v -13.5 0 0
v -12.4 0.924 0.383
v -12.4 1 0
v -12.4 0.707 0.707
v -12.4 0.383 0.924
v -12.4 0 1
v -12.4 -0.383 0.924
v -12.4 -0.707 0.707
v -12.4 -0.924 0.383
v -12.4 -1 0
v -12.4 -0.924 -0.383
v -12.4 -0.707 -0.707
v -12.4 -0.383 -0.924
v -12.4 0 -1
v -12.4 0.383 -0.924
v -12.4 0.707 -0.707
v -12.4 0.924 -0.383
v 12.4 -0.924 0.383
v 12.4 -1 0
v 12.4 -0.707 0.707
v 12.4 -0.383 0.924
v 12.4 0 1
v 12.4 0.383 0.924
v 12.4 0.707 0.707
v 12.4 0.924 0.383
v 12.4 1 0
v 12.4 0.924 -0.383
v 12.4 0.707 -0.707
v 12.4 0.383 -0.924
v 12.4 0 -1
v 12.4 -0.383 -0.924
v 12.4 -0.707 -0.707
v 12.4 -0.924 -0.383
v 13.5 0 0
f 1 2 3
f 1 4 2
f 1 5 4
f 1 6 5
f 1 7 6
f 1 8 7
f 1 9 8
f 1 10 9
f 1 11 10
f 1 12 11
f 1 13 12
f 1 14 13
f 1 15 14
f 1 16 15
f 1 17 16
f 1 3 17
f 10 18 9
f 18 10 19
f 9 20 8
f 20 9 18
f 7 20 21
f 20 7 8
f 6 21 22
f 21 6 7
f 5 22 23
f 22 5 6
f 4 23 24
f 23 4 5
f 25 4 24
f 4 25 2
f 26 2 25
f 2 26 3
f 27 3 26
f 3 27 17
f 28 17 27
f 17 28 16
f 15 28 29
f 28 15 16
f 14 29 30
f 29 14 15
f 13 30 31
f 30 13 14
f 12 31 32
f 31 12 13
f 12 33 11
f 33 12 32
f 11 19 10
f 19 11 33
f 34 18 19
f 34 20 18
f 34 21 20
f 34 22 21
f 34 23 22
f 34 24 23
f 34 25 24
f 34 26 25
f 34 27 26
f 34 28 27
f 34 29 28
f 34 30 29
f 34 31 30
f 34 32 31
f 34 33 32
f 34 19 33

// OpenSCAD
// file: ../p/4-4edge.scad
use <../lib.scad>
function ldraw_lib__4_4edge() = [
// 0 Circle 1.0
// 0 Name: 4-4edge.dat
// 0 Author: James Jessiman
// 0 !LDRAW_ORG Primitive UPDATE 2017-01
// 0 !LICENSE Licensed under CC BY 2.0 and CC BY 4.0 : see CAreadme.txt
// 
// 0 BFC CERTIFY CCW
  [0,"BFC","CERTIFY"],
  [0,"BFC","CCW"],
// 
// 0 !HISTORY 1998-12-15 [PTadmin] Official Update 1998-10
// 0 !HISTORY 2005-12-28 [PTadmin] Official Update 2005-01
// 0 !HISTORY 2007-06-24 [PTadmin] Header formatted for Contributor Agreement
// 0 !HISTORY 2008-07-01 [PTadmin] Official Update 2008-01
// 0 !HISTORY 2017-01-15 [Steffen] BFCed
// 0 !HISTORY 2017-12-30 [PTadmin] Official Update 2017-01
// 
// 
// 2 24 1 0 0 0.9239 0 0.3827
  [2,24,1,0,0,0.9239,0,0.3827],
// 2 24 0.9239 0 0.3827 0.7071 0 0.7071
  [2,24,0.9239,0,0.3827,0.7071,0,0.7071],
// 2 24 0.7071 0 0.7071 0.3827 0 0.9239
  [2,24,0.7071,0,0.7071,0.3827,0,0.9239],
// 2 24 0.3827 0 0.9239 0 0 1
  [2,24,0.3827,0,0.9239,0,0,1],
// 2 24 0 0 1 -0.3827 0 0.9239
  [2,24,0,0,1,-0.3827,0,0.9239],
// 2 24 -0.3827 0 0.9239 -0.7071 0 0.7071
  [2,24,-0.3827,0,0.9239,-0.7071,0,0.7071],
// 2 24 -0.7071 0 0.7071 -0.9239 0 0.3827
  [2,24,-0.7071,0,0.7071,-0.9239,0,0.3827],
// 2 24 -0.9239 0 0.3827 -1 0 -0
  [2,24,-0.9239,0,0.3827,-1,0,-0],
// 2 24 -1 0 -0 -0.9239 0 -0.3827
  [2,24,-1,0,-0,-0.9239,0,-0.3827],
// 2 24 -0.9239 0 -0.3827 -0.7071 0 -0.7071
  [2,24,-0.9239,0,-0.3827,-0.7071,0,-0.7071],
// 2 24 -0.7071 0 -0.7071 -0.3827 0 -0.9239
  [2,24,-0.7071,0,-0.7071,-0.3827,0,-0.9239],
// 2 24 -0.3827 0 -0.9239 0 0 -1
  [2,24,-0.3827,0,-0.9239,0,0,-1],
// 2 24 0 0 -1 0.3827 0 -0.9239
  [2,24,0,0,-1,0.3827,0,-0.9239],
// 2 24 0.3827 0 -0.9239 0.7071 0 -0.7071
  [2,24,0.3827,0,-0.9239,0.7071,0,-0.7071],
// 2 24 0.7071 0 -0.7071 0.9239 0 -0.3827
  [2,24,0.7071,0,-0.7071,0.9239,0,-0.3827],
// 2 24 0.9239 0 -0.3827 1 0 0
  [2,24,0.9239,0,-0.3827,1,0,0],
];
makepoly(ldraw_lib__4_4edge(), line=0.2);
// file: ../p/4-4cyli.scad
use <../lib.scad>
function ldraw_lib__4_4cyli() = [
// 0 Cylinder 1.0
// 0 Name: 4-4cyli.dat
// 0 Author: James Jessiman
// 0 !LDRAW_ORG Primitive UPDATE 2005-01
// 0 !LICENSE Licensed under CC BY 2.0 and CC BY 4.0 : see CAreadme.txt
// 
// 0 BFC CERTIFY CCW
  [0,"BFC","CERTIFY"],
  [0,"BFC","CCW"],
// 
// 0 !HISTORY 1998-12-15 [PTadmin] Official Update 1998-10
// 0 !HISTORY 2002-03-23 [sbliss] Added BFC statement; merged headers from files in distributions LDraw 0.27 and Complete.
// 0 !HISTORY 2002-04-25 [PTadmin] Official Update 2002-02
// 0 !HISTORY 2004-12-14 [guyvivan] BFC CCW
// 0 !HISTORY 2005-12-28 [PTadmin] Official Update 2005-01
// 0 !HISTORY 2007-06-24 [PTadmin] Header formatted for Contributor Agreement
// 0 !HISTORY 2008-07-01 [PTadmin] Official Update 2008-01
// 
// 
// 4 16 1 1 0 0.9239 1 0.3827 0.9239 0 0.3827 1 0 0
  [4,16,1,1,0,0.9239,1,0.3827,0.9239,0,0.3827,1,0,0],
// 5 24 1 0 0 1 1 0 0.9239 0 0.3827 0.9239 0 -0.3827
  [5,24,1,0,0,1,1,0,0.9239,0,0.3827,0.9239,0,-0.3827],
// 4 16 0.9239 1 0.3827 0.7071 1 0.7071 0.7071 0 0.7071 0.9239 0 0.3827
  [4,16,0.9239,1,0.3827,0.7071,1,0.7071,0.7071,0,0.7071,0.9239,0,0.3827],
// 5 24 0.9239 0 0.3827 0.9239 1 0.3827 0.7071 0 0.7071 1 0 0
  [5,24,0.9239,0,0.3827,0.9239,1,0.3827,0.7071,0,0.7071,1,0,0],
// 4 16 0.7071 1 0.7071 0.3827 1 0.9239 0.3827 0 0.9239 0.7071 0 0.7071
  [4,16,0.7071,1,0.7071,0.3827,1,0.9239,0.3827,0,0.9239,0.7071,0,0.7071],
// 5 24 0.7071 0 0.7071 0.7071 1 0.7071 0.3827 0 0.9239 0.9239 0 0.3827
  [5,24,0.7071,0,0.7071,0.7071,1,0.7071,0.3827,0,0.9239,0.9239,0,0.3827],
// 4 16 0.3827 1 0.9239 0 1 1 0 0 1 0.3827 0 0.9239
  [4,16,0.3827,1,0.9239,0,1,1,0,0,1,0.3827,0,0.9239],
// 5 24 0.3827 0 0.9239 0.3827 1 0.9239 0 0 1 0.7071 0 0.7071
  [5,24,0.3827,0,0.9239,0.3827,1,0.9239,0,0,1,0.7071,0,0.7071],
// 4 16 0 1 1 -0.3827 1 0.9239 -0.3827 0 0.9239 0 0 1
  [4,16,0,1,1,-0.3827,1,0.9239,-0.3827,0,0.9239,0,0,1],
// 5 24 0 0 1 0 1 1 -0.3827 0 0.9239 0.3827 0 0.9239
  [5,24,0,0,1,0,1,1,-0.3827,0,0.9239,0.3827,0,0.9239],
// 4 16 -0.3827 1 0.9239 -0.7071 1 0.7071 -0.7071 0 0.7071 -0.3827 0 0.9239
  [4,16,-0.3827,1,0.9239,-0.7071,1,0.7071,-0.7071,0,0.7071,-0.3827,0,0.9239],
// 5 24 -0.3827 0 0.9239 -0.3827 1 0.9239 -0.7071 0 0.7071 0 0 1
  [5,24,-0.3827,0,0.9239,-0.3827,1,0.9239,-0.7071,0,0.7071,0,0,1],
// 4 16 -0.7071 1 0.7071 -0.9239 1 0.3827 -0.9239 0 0.3827 -0.7071 0 0.7071
  [4,16,-0.7071,1,0.7071,-0.9239,1,0.3827,-0.9239,0,0.3827,-0.7071,0,0.7071],
// 5 24 -0.7071 0 0.7071 -0.7071 1 0.7071 -0.9239 0 0.3827 -0.3827 0 0.9239
  [5,24,-0.7071,0,0.7071,-0.7071,1,0.7071,-0.9239,0,0.3827,-0.3827,0,0.9239],
// 4 16 -0.9239 1 0.3827 -1 1 0 -1 0 0 -0.9239 0 0.3827
  [4,16,-0.9239,1,0.3827,-1,1,0,-1,0,0,-0.9239,0,0.3827],
// 5 24 -0.9239 0 0.3827 -0.9239 1 0.3827 -1 0 0 -0.7071 0 0.7071
  [5,24,-0.9239,0,0.3827,-0.9239,1,0.3827,-1,0,0,-0.7071,0,0.7071],
// 4 16 -1 1 0 -0.9239 1 -0.3827 -0.9239 0 -0.3827 -1 0 0
  [4,16,-1,1,0,-0.9239,1,-0.3827,-0.9239,0,-0.3827,-1,0,0],
// 5 24 -1 0 0 -1 1 0 -0.9239 0 -0.3827 -0.9239 0 0.3827
  [5,24,-1,0,0,-1,1,0,-0.9239,0,-0.3827,-0.9239,0,0.3827],
// 4 16 -0.9239 1 -0.3827 -0.7071 1 -0.7071 -0.7071 0 -0.7071 -0.9239 0 -0.3827
  [4,16,-0.9239,1,-0.3827,-0.7071,1,-0.7071,-0.7071,0,-0.7071,-0.9239,0,-0.3827],
// 5 24 -0.9239 0 -0.3827 -0.9239 1 -0.3827 -0.7071 0 -0.7071 -1 0 0
  [5,24,-0.9239,0,-0.3827,-0.9239,1,-0.3827,-0.7071,0,-0.7071,-1,0,0],
// 4 16 -0.7071 1 -0.7071 -0.3827 1 -0.9239 -0.3827 0 -0.9239 -0.7071 0 -0.7071
  [4,16,-0.7071,1,-0.7071,-0.3827,1,-0.9239,-0.3827,0,-0.9239,-0.7071,0,-0.7071],
// 5 24 -0.7071 0 -0.7071 -0.7071 1 -0.7071 -0.3827 0 -0.9239 -0.9239 0 -0.3827
  [5,24,-0.7071,0,-0.7071,-0.7071,1,-0.7071,-0.3827,0,-0.9239,-0.9239,0,-0.3827],
// 4 16 -0.3827 1 -0.9239 0 1 -1 0 0 -1 -0.3827 0 -0.9239
  [4,16,-0.3827,1,-0.9239,0,1,-1,0,0,-1,-0.3827,0,-0.9239],
// 5 24 -0.3827 0 -0.9239 -0.3827 1 -0.9239 0 0 -1 -0.7071 0 -0.7071
  [5,24,-0.3827,0,-0.9239,-0.3827,1,-0.9239,0,0,-1,-0.7071,0,-0.7071],
// 4 16 0 1 -1 0.3827 1 -0.9239 0.3827 0 -0.9239 0 0 -1
  [4,16,0,1,-1,0.3827,1,-0.9239,0.3827,0,-0.9239,0,0,-1],
// 5 24 0 0 -1 0 1 -1 0.3827 0 -0.9239 -0.3827 0 -0.9239
  [5,24,0,0,-1,0,1,-1,0.3827,0,-0.9239,-0.3827,0,-0.9239],
// 4 16 0.3827 1 -0.9239 0.7071 1 -0.7071 0.7071 0 -0.7071 0.3827 0 -0.9239
  [4,16,0.3827,1,-0.9239,0.7071,1,-0.7071,0.7071,0,-0.7071,0.3827,0,-0.9239],
// 5 24 0.3827 0 -0.9239 0.3827 1 -0.9239 0.7071 0 -0.7071 0 0 -1
  [5,24,0.3827,0,-0.9239,0.3827,1,-0.9239,0.7071,0,-0.7071,0,0,-1],
// 4 16 0.7071 1 -0.7071 0.9239 1 -0.3827 0.9239 0 -0.3827 0.7071 0 -0.7071
  [4,16,0.7071,1,-0.7071,0.9239,1,-0.3827,0.9239,0,-0.3827,0.7071,0,-0.7071],
// 5 24 0.7071 0 -0.7071 0.7071 1 -0.7071 0.9239 0 -0.3827 0.3827 0 -0.9239
  [5,24,0.7071,0,-0.7071,0.7071,1,-0.7071,0.9239,0,-0.3827,0.3827,0,-0.9239],
// 4 16 0.9239 1 -0.3827 1 1 0 1 0 0 0.9239 0 -0.3827
  [4,16,0.9239,1,-0.3827,1,1,0,1,0,0,0.9239,0,-0.3827],
// 5 24 0.9239 0 -0.3827 0.9239 1 -0.3827 1 0 0 0.7071 0 -0.7071
  [5,24,0.9239,0,-0.3827,0.9239,1,-0.3827,1,0,0,0.7071,0,-0.7071],
// 0
];
makepoly(ldraw_lib__4_4cyli(), line=0.2);
// file: ../p/4-4cylo.scad
use <../lib.scad>
use <4-4cyli.scad>
use <4-4edge.scad>
function ldraw_lib__4_4cylo() = [
// 0 Cylinder Open 1.0
// 0 Name: 4-4cylo.dat
// 0 Author: Mark Kennedy [mkennedy]
// 0 !LDRAW_ORG Primitive UPDATE 2010-01
// 0 !LICENSE Licensed under CC BY 2.0 and CC BY 4.0 : see CAreadme.txt
// 
// 0 BFC CERTIFY CCW
  [0,"BFC","CERTIFY"],
  [0,"BFC","CCW"],
// 
// 0 !HISTORY 2010-04-05 [PTadmin] Official Update 2010-01
// 
// 
// 1 16 0 0 0 1 0 0 0 1 0 0 0 1 4-4edge.dat
  [1,16,0,0,0,1,0,0,0,1,0,0,0,1, ldraw_lib__4_4edge()],
// 1 16 0 1 0 1 0 0 0 1 0 0 0 1 4-4edge.dat
  [1,16,0,1,0,1,0,0,0,1,0,0,0,1, ldraw_lib__4_4edge()],
// 1 16 0 0 0 1 0 0 0 1 0 0 0 1 4-4cyli.dat
  [1,16,0,0,0,1,0,0,0,1,0,0,0,1, ldraw_lib__4_4cyli()],
// 0
];
makepoly(ldraw_lib__4_4cylo(), line=0.2);
// file: ../p/4-4con0.scad
use <../lib.scad>
function ldraw_lib__4_4con0() = [
// 0 Cone  0 x 1.0
// 0 Name: 4-4con0.dat
// 0 Author: William Howard [WilliamH]
// 0 !LDRAW_ORG Primitive UPDATE 2009-03
// 0 !LICENSE Licensed under CC BY 2.0 and CC BY 4.0 : see CAreadme.txt
// 
// 0 BFC CERTIFY CCW
  [0,"BFC","CERTIFY"],
  [0,"BFC","CCW"],
// 
// 0 !HISTORY 2009-12-29 [PTadmin] Official Update 2009-03
// 
// 
// 3 16 0 1 0 0.9239 0 0.3827 1 0 0
  [3,16,0,1,0,0.9239,0,0.3827,1,0,0],
// 3 16 0 1 0 0.7071 0 0.7071 0.9239 0 0.3827
  [3,16,0,1,0,0.7071,0,0.7071,0.9239,0,0.3827],
// 3 16 0 1 0 0.3827 0 0.9239 0.7071 0 0.7071
  [3,16,0,1,0,0.3827,0,0.9239,0.7071,0,0.7071],
// 3 16 0 1 0 0 0 1 0.3827 0 0.9239
  [3,16,0,1,0,0,0,1,0.3827,0,0.9239],
// 3 16 0 1 0 -0.3827 0 0.9239 0 0 1
  [3,16,0,1,0,-0.3827,0,0.9239,0,0,1],
// 3 16 0 1 0 -0.7071 0 0.7071 -0.3827 0 0.9239
  [3,16,0,1,0,-0.7071,0,0.7071,-0.3827,0,0.9239],
// 3 16 0 1 0 -0.9239 0 0.3827 -0.7071 0 0.7071
  [3,16,0,1,0,-0.9239,0,0.3827,-0.7071,0,0.7071],
// 3 16 0 1 0 -1 0 0 -0.9239 0 0.3827
  [3,16,0,1,0,-1,0,0,-0.9239,0,0.3827],
// 3 16 0 1 0 -0.9239 0 -0.3827 -1 0 0
  [3,16,0,1,0,-0.9239,0,-0.3827,-1,0,0],
// 3 16 0 1 0 -0.7071 0 -0.7071 -0.9239 0 -0.3827
  [3,16,0,1,0,-0.7071,0,-0.7071,-0.9239,0,-0.3827],
// 3 16 0 1 0 -0.3827 0 -0.9239 -0.7071 0 -0.7071
  [3,16,0,1,0,-0.3827,0,-0.9239,-0.7071,0,-0.7071],
// 3 16 0 1 0 0 0 -1 -0.3827 0 -0.9239
  [3,16,0,1,0,0,0,-1,-0.3827,0,-0.9239],
// 3 16 0 1 0 0.3827 0 -0.9239 0 0 -1
  [3,16,0,1,0,0.3827,0,-0.9239,0,0,-1],
// 3 16 0 1 0 0.7071 0 -0.7071 0.3827 0 -0.9239
  [3,16,0,1,0,0.7071,0,-0.7071,0.3827,0,-0.9239],
// 3 16 0 1 0 0.9239 0 -0.3827 0.7071 0 -0.7071
  [3,16,0,1,0,0.9239,0,-0.3827,0.7071,0,-0.7071],
// 3 16 0 1 0 1 0 0 0.9239 0 -0.3827
  [3,16,0,1,0,1,0,0,0.9239,0,-0.3827],
// 
// 0 conditional lines
// 5 24 0 1 0 1 0 0 0.9239 0 -0.3827 0.9239 0 0.3827
  [5,24,0,1,0,1,0,0,0.9239,0,-0.3827,0.9239,0,0.3827],
// 5 24 0 1 0 0.9239 0 0.3827 1 0 0 0.7071 0 0.7071
  [5,24,0,1,0,0.9239,0,0.3827,1,0,0,0.7071,0,0.7071],
// 5 24 0 1 0 0.7071 0 0.7071 0.9239 0 0.3827 0.3827 0 0.9239
  [5,24,0,1,0,0.7071,0,0.7071,0.9239,0,0.3827,0.3827,0,0.9239],
// 5 24 0 1 0 0.3827 0 0.9239 0.7071 0 0.7071 0 0 1
  [5,24,0,1,0,0.3827,0,0.9239,0.7071,0,0.7071,0,0,1],
// 5 24 0 1 0 0 0 1 0.3827 0 0.9239 -0.3827 0 0.9239
  [5,24,0,1,0,0,0,1,0.3827,0,0.9239,-0.3827,0,0.9239],
// 5 24 0 1 0 -0.3827 0 0.9239 0 0 1 -0.7071 0 0.7071
  [5,24,0,1,0,-0.3827,0,0.9239,0,0,1,-0.7071,0,0.7071],
// 5 24 0 1 0 -0.7071 0 0.7071 -0.3827 0 0.9239 -0.9239 0 0.3827
  [5,24,0,1,0,-0.7071,0,0.7071,-0.3827,0,0.9239,-0.9239,0,0.3827],
// 5 24 0 1 0 -0.9239 0 0.3827 -0.7071 0 0.7071 -1 0 0
  [5,24,0,1,0,-0.9239,0,0.3827,-0.7071,0,0.7071,-1,0,0],
// 5 24 0 1 0 -1 0 0 -0.9239 0 0.3827 -0.9239 0 -0.3827
  [5,24,0,1,0,-1,0,0,-0.9239,0,0.3827,-0.9239,0,-0.3827],
// 5 24 0 1 0 -0.9239 0 -0.3827 -1 0 0 -0.7071 0 -0.7071
  [5,24,0,1,0,-0.9239,0,-0.3827,-1,0,0,-0.7071,0,-0.7071],
// 5 24 0 1 0 -0.7071 0 -0.7071 -0.9239 0 -0.3827 -0.3827 0 -0.9239
  [5,24,0,1,0,-0.7071,0,-0.7071,-0.9239,0,-0.3827,-0.3827,0,-0.9239],
// 5 24 0 1 0 -0.3827 0 -0.9239 -0.7071 0 -0.7071 0 0 -1
  [5,24,0,1,0,-0.3827,0,-0.9239,-0.7071,0,-0.7071,0,0,-1],
// 5 24 0 1 0 0 0 -1 -0.3827 0 -0.9239 0.3827 0 -0.9239
  [5,24,0,1,0,0,0,-1,-0.3827,0,-0.9239,0.3827,0,-0.9239],
// 5 24 0 1 0 0.3827 0 -0.9239 0 0 -1 0.7071 0 -0.7071
  [5,24,0,1,0,0.3827,0,-0.9239,0,0,-1,0.7071,0,-0.7071],
// 5 24 0 1 0 0.7071 0 -0.7071 0.3827 0 -0.9239 0.9239 0 -0.3827
  [5,24,0,1,0,0.7071,0,-0.7071,0.3827,0,-0.9239,0.9239,0,-0.3827],
// 5 24 0 1 0 0.9239 0 -0.3827 0.7071 0 -0.7071 1 0 0
  [5,24,0,1,0,0.9239,0,-0.3827,0.7071,0,-0.7071,1,0,0],
// 
// 0 end of file
];
makepoly(ldraw_lib__4_4con0(), line=0.2);
// main file
use <../lib.scad>
use <../p/4-4con0.scad>
use <../p/4-4cylo.scad>
function ldraw_lib__u9185() = [
// 0 ~Axle Steel  5 x 67.5 for Monorail Motor and Chassis
// 0 Name: u9185.dat
// 0 Author: Magnus Forsberg [MagFors]
// 0 !LDRAW_ORG Part UPDATE 2013-01
// 0 !LICENSE Licensed under CC BY 2.0 and CC BY 4.0 : see CAreadme.txt
// 
// 0 BFC CERTIFY CCW
  [0,"BFC","CERTIFY"],
  [0,"BFC","CCW"],
// 
// 0 !CATEGORY Wheel
// 
// 0 !HISTORY 2013-07-21 [PTadmin] Official Update 2013-01
// 
// 
// 1 16 -31 0 0 0 -2.75 0 0 0 -2.5 2.5 0 0 4-4con0.dat
  [1,16,-31,0,0,0,-2.75,0,0,0,-2.5,2.5,0,0, ldraw_lib__4_4con0()],
// 1 16 -31 0 0 0 62 0 0 0 -2.5 -2.5 0 0 4-4cylo.dat
  [1,16,-31,0,0,0,62,0,0,0,-2.5,-2.5,0,0, ldraw_lib__4_4cylo()],
// 1 16 31 0 0 0 2.75 0 0 0 -2.5 -2.5 0 0 4-4con0.dat
  [1,16,31,0,0,0,2.75,0,0,0,-2.5,-2.5,0,0, ldraw_lib__4_4con0()],
];
makepoly(ldraw_lib__u9185(), line=0.2);
